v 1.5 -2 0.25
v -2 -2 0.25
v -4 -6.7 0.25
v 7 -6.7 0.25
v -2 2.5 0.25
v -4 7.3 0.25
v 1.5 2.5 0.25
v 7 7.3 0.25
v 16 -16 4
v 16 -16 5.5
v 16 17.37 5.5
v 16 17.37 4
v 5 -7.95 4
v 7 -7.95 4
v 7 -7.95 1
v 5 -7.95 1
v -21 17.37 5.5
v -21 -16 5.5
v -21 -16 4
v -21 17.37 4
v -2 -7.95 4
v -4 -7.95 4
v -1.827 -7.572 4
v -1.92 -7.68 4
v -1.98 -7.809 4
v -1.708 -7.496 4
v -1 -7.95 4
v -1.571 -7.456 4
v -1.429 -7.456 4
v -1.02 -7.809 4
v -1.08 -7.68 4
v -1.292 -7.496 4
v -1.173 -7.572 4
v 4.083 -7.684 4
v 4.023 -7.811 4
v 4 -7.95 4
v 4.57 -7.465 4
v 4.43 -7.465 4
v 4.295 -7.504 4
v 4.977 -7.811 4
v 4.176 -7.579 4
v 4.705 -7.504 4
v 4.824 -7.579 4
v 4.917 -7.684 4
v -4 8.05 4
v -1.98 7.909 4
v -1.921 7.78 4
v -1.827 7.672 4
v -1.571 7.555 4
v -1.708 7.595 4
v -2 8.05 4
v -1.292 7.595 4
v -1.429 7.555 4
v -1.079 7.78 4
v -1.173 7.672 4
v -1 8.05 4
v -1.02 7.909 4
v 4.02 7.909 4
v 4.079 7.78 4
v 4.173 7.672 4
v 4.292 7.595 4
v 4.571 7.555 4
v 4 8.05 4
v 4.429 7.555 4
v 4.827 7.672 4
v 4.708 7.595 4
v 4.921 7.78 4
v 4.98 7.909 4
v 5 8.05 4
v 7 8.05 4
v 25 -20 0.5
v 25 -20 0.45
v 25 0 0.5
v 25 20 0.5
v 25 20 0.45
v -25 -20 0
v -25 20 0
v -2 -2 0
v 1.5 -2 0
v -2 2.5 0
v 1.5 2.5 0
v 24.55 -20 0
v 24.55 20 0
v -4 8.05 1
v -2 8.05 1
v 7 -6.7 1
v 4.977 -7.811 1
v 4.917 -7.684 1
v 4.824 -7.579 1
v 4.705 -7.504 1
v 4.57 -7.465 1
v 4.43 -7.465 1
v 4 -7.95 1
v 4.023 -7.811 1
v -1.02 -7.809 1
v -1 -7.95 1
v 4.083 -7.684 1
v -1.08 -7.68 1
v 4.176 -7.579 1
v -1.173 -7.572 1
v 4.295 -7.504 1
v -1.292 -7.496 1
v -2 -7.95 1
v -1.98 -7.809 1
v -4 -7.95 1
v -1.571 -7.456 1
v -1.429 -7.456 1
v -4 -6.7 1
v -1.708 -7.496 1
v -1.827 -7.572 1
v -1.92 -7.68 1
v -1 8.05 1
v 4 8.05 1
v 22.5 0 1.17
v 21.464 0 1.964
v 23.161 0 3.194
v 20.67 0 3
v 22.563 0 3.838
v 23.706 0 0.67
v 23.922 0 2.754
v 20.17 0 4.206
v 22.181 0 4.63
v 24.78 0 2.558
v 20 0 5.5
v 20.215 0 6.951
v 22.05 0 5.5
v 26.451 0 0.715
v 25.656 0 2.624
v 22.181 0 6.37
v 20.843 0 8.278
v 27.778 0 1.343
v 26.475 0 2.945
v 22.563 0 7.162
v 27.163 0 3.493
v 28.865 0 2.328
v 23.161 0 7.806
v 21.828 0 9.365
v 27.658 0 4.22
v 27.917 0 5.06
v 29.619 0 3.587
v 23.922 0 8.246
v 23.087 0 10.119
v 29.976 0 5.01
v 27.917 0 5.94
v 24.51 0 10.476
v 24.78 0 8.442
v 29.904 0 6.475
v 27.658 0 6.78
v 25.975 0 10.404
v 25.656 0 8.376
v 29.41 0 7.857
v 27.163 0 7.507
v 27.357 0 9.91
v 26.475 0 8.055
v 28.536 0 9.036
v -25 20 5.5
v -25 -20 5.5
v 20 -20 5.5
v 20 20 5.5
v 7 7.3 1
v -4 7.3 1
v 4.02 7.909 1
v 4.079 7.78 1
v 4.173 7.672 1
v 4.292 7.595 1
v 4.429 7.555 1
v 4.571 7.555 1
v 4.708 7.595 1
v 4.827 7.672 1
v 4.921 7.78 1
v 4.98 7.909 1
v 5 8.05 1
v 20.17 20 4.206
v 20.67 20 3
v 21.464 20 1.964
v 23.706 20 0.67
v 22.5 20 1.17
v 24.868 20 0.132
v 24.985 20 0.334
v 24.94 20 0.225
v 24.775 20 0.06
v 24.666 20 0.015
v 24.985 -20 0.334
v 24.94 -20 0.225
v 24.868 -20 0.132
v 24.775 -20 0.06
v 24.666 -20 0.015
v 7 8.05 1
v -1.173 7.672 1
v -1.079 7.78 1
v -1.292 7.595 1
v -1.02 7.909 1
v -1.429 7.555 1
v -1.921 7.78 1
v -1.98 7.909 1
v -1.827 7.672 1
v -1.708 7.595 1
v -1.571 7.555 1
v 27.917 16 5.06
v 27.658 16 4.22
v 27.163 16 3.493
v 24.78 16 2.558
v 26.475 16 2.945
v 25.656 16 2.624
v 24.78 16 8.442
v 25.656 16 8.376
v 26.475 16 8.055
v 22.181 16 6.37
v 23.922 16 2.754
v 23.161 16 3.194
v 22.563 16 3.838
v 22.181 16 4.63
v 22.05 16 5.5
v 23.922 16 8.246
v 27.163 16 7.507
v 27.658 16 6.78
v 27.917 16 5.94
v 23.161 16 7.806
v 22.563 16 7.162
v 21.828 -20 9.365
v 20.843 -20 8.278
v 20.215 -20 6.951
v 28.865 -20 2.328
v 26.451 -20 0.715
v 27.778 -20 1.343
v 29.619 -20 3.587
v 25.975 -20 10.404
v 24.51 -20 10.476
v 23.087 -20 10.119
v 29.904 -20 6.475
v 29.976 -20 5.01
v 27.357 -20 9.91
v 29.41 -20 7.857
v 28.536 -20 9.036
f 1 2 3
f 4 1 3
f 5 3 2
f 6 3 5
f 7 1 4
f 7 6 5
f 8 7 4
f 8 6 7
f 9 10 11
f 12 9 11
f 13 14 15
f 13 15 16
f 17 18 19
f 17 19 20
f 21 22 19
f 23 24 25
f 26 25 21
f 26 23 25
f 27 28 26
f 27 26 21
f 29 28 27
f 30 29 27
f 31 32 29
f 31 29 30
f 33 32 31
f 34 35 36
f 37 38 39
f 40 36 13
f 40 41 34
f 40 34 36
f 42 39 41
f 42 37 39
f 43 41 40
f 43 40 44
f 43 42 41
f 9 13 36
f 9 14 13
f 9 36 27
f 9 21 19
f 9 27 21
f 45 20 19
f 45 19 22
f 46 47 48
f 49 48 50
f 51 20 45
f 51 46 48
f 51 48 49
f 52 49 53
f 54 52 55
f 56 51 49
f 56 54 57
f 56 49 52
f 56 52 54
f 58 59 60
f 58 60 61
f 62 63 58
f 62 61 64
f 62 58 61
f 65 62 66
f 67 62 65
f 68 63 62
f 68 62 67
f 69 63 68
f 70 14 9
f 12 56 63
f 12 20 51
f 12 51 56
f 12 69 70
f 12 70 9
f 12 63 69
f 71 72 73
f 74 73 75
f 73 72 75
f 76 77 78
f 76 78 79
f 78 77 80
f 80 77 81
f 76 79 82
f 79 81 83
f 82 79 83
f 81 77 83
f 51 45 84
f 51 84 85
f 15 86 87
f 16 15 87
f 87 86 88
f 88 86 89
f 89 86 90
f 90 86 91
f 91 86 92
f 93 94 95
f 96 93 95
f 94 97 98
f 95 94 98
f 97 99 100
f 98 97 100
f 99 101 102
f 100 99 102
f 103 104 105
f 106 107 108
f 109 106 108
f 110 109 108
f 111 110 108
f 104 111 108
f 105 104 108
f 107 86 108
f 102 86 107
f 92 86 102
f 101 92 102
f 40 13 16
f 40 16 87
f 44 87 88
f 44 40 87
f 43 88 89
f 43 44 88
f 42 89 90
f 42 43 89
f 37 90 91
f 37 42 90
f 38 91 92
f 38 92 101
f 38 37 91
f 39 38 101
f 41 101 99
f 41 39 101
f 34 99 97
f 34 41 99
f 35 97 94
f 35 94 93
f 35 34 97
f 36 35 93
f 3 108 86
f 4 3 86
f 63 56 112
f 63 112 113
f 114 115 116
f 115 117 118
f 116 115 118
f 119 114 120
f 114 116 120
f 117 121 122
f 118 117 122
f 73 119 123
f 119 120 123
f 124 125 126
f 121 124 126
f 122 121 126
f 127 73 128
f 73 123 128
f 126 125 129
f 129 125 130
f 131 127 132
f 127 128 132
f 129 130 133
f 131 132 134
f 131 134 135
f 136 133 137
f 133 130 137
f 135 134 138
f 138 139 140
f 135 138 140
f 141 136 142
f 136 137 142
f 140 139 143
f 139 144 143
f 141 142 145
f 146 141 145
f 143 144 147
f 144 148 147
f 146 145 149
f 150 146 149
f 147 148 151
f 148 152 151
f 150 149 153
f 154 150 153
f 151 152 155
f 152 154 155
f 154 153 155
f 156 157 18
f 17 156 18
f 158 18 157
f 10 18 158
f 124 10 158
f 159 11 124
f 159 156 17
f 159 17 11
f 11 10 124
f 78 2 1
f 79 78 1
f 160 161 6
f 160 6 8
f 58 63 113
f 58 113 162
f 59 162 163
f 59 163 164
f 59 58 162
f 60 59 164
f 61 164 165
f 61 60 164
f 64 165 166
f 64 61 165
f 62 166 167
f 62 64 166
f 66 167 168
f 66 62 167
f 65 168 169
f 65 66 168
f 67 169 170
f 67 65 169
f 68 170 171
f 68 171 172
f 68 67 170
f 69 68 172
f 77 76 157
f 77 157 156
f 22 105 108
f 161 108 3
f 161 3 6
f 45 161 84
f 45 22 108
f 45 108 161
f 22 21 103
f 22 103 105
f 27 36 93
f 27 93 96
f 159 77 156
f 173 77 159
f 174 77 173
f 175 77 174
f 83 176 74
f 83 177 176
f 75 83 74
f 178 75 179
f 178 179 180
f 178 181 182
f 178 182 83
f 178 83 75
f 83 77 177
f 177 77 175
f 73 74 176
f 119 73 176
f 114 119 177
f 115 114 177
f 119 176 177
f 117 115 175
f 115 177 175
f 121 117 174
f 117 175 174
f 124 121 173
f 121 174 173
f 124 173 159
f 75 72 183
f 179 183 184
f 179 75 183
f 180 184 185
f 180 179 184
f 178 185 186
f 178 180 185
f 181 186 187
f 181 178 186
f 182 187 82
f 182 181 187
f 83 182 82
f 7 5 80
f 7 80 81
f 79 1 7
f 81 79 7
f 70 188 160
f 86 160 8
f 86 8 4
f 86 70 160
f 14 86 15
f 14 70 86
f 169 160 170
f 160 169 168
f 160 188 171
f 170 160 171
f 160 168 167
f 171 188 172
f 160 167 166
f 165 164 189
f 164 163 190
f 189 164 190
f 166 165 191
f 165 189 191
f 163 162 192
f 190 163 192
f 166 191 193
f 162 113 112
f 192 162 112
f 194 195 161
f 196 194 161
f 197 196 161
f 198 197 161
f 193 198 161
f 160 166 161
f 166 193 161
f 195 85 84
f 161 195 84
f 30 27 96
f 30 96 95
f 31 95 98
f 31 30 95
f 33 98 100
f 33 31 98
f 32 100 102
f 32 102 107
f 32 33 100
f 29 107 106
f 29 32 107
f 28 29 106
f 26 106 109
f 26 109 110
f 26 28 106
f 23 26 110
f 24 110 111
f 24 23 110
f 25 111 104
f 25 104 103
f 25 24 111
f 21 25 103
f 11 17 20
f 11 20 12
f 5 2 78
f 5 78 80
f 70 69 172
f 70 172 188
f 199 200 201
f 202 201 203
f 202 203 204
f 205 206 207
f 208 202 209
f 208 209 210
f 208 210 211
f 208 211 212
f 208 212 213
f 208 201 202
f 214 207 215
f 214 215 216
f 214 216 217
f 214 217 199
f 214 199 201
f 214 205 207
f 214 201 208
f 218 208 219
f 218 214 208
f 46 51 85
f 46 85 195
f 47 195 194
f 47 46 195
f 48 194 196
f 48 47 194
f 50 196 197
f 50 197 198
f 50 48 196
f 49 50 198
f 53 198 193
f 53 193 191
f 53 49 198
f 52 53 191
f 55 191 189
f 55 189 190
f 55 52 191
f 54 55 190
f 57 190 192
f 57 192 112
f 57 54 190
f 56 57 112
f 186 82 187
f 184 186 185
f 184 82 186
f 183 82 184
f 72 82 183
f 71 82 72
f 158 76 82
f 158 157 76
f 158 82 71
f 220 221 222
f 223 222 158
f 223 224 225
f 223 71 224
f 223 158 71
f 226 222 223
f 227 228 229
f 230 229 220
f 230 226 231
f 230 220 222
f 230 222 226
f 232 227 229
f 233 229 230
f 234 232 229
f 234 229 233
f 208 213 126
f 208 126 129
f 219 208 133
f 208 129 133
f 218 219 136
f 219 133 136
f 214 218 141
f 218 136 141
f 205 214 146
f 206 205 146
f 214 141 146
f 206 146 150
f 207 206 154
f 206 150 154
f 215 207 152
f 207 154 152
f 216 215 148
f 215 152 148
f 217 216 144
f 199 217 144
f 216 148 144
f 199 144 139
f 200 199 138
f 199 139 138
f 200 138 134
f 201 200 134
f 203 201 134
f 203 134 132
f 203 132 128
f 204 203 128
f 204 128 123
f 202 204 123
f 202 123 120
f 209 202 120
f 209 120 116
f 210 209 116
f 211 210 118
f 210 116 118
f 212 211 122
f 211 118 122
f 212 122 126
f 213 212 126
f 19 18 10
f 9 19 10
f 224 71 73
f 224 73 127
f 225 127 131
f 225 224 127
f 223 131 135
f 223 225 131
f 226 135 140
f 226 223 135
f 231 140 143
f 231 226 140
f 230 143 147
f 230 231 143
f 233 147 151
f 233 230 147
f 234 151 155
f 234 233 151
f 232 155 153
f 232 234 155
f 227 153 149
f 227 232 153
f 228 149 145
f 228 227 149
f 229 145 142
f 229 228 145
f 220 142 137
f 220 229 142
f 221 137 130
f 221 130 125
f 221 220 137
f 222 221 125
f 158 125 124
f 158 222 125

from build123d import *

# Parameters (mm, degrees)
SKETCH_W        = 50
SKETCH_H        = 40
PAD_DEPTH       = 5.5
SKETCH004_W     = 3.5
SKETCH004_H     = 4.5
POCKET_DEPTH    = 5.501
SKETCH005_W     = 11
SKETCH005_H     = 14
POCKET001_DEPTH = 5.25
POCKET002_DEPTH = 4.5
SKETCH008_R     = 5
PAD001_DEPTH    = 20
SKETCH009_R     = 5
HOLE_DEPTH      = 20
FILLET_R        = 0.45
SKETCH010_W     = 37
SKETCH010_H     = 33.369954
POCKET003_DEPTH = 1.5
SKETCH012_R     = 2.95
PAD002_DEPTH    = 16


with BuildPart() as part:
    # Sketch → Pad (new body)
    with BuildSketch(Plane.XY):
        Rectangle(SKETCH_W, SKETCH_H)
    extrude(amount=PAD_DEPTH)

    # Sketch004 (on Face6 of Pad) → Pocket (cut, through all)
    with BuildSketch(Plane.XY.offset(5.5)):
        with Locations((-0.25, 0.25)):
            Rectangle(SKETCH004_W, SKETCH004_H)
    extrude(amount=-POCKET_DEPTH, mode=Mode.SUBTRACT)

    # Sketch005 (on Face5 of Pocket) → Pocket001 (cut)
    with BuildSketch(Plane.XY.offset(5.5)):
        with Locations((1.5, 0.3)):
            Rectangle(SKETCH005_W, SKETCH005_H)
    extrude(amount=-POCKET001_DEPTH, mode=Mode.SUBTRACT)

    # Sketch007 (on Face5 of Pocket001) → Pocket002 (cut)
    with BuildSketch(Plane.XY.offset(5.5)):
        with BuildLine():
            Line((-4, 8.05), (-2, 8.05))
            ThreePointArc((-2, 8.05), (-1.5, 7.550047), (-1, 8.05))
            Line((-1, 8.05), (4, 8.05))
            ThreePointArc((4, 8.05), (4.5, 7.54996), (5, 8.05))
            Line((5, 8.05), (7, 8.05))
            Line((7, 8.05), (7, -7.95))
            Line((7, -7.95), (4.999901, -7.95))
            ThreePointArc((4.999901, -7.95), (4.5, -7.459951), (4.000099, -7.95))
            Line((4.000099, -7.95), (-1, -7.95))
            ThreePointArc((-1, -7.95), (-1.5, -7.45043), (-2, -7.95))
            Line((-2, -7.95), (-4, -7.95))
            Line((-4, -7.95), (-4, 8.05))
        make_face()
    extrude(amount=-POCKET002_DEPTH, mode=Mode.SUBTRACT)

    # Sketch008 (on Face6 of Pocket002) → Pad001 (join)
    with BuildSketch(Plane.XZ.offset(20)):
        with Locations((25, 5.5)):
            Circle(SKETCH008_R)
    extrude(amount=-PAD001_DEPTH)

    # Sketch009 (on Face1 of Pad001) → Hole (cut)
    with BuildSketch(Plane(origin=(0, 20, 0), x_dir=(-1, 0, 0), z_dir=(0, 1, 0))):
        with Locations((-25, 5.5)):
            Circle(SKETCH009_R)
    extrude(amount=-HOLE_DEPTH, mode=Mode.SUBTRACT)

    # Fillet
    fillet_edges = [part.edges().sort_by_distance(p)[0] for p in [
        (25, 0, 0),
    ]]
    fillet(fillet_edges, radius=FILLET_R)

    # Sketch010 (on Face6 of Fillet) → Pocket003 (cut)
    with BuildSketch(Plane.XY.offset(5.5)):
        with Locations((-2.5, 0.684977)):
            Rectangle(SKETCH010_W, SKETCH010_H)
    extrude(amount=-POCKET003_DEPTH, mode=Mode.SUBTRACT)

    # Sketch012 (on Face22 of Pocket003) → Pad002 (join)
    with BuildSketch(Plane(origin=(0, 0, 0), x_dir=(-1, 0, 0), z_dir=(0, 1, 0))):
        with Locations((-25.000006, 5.5)):
            Circle(SKETCH012_R)
    extrude(amount=PAD002_DEPTH)


solid = part.part
